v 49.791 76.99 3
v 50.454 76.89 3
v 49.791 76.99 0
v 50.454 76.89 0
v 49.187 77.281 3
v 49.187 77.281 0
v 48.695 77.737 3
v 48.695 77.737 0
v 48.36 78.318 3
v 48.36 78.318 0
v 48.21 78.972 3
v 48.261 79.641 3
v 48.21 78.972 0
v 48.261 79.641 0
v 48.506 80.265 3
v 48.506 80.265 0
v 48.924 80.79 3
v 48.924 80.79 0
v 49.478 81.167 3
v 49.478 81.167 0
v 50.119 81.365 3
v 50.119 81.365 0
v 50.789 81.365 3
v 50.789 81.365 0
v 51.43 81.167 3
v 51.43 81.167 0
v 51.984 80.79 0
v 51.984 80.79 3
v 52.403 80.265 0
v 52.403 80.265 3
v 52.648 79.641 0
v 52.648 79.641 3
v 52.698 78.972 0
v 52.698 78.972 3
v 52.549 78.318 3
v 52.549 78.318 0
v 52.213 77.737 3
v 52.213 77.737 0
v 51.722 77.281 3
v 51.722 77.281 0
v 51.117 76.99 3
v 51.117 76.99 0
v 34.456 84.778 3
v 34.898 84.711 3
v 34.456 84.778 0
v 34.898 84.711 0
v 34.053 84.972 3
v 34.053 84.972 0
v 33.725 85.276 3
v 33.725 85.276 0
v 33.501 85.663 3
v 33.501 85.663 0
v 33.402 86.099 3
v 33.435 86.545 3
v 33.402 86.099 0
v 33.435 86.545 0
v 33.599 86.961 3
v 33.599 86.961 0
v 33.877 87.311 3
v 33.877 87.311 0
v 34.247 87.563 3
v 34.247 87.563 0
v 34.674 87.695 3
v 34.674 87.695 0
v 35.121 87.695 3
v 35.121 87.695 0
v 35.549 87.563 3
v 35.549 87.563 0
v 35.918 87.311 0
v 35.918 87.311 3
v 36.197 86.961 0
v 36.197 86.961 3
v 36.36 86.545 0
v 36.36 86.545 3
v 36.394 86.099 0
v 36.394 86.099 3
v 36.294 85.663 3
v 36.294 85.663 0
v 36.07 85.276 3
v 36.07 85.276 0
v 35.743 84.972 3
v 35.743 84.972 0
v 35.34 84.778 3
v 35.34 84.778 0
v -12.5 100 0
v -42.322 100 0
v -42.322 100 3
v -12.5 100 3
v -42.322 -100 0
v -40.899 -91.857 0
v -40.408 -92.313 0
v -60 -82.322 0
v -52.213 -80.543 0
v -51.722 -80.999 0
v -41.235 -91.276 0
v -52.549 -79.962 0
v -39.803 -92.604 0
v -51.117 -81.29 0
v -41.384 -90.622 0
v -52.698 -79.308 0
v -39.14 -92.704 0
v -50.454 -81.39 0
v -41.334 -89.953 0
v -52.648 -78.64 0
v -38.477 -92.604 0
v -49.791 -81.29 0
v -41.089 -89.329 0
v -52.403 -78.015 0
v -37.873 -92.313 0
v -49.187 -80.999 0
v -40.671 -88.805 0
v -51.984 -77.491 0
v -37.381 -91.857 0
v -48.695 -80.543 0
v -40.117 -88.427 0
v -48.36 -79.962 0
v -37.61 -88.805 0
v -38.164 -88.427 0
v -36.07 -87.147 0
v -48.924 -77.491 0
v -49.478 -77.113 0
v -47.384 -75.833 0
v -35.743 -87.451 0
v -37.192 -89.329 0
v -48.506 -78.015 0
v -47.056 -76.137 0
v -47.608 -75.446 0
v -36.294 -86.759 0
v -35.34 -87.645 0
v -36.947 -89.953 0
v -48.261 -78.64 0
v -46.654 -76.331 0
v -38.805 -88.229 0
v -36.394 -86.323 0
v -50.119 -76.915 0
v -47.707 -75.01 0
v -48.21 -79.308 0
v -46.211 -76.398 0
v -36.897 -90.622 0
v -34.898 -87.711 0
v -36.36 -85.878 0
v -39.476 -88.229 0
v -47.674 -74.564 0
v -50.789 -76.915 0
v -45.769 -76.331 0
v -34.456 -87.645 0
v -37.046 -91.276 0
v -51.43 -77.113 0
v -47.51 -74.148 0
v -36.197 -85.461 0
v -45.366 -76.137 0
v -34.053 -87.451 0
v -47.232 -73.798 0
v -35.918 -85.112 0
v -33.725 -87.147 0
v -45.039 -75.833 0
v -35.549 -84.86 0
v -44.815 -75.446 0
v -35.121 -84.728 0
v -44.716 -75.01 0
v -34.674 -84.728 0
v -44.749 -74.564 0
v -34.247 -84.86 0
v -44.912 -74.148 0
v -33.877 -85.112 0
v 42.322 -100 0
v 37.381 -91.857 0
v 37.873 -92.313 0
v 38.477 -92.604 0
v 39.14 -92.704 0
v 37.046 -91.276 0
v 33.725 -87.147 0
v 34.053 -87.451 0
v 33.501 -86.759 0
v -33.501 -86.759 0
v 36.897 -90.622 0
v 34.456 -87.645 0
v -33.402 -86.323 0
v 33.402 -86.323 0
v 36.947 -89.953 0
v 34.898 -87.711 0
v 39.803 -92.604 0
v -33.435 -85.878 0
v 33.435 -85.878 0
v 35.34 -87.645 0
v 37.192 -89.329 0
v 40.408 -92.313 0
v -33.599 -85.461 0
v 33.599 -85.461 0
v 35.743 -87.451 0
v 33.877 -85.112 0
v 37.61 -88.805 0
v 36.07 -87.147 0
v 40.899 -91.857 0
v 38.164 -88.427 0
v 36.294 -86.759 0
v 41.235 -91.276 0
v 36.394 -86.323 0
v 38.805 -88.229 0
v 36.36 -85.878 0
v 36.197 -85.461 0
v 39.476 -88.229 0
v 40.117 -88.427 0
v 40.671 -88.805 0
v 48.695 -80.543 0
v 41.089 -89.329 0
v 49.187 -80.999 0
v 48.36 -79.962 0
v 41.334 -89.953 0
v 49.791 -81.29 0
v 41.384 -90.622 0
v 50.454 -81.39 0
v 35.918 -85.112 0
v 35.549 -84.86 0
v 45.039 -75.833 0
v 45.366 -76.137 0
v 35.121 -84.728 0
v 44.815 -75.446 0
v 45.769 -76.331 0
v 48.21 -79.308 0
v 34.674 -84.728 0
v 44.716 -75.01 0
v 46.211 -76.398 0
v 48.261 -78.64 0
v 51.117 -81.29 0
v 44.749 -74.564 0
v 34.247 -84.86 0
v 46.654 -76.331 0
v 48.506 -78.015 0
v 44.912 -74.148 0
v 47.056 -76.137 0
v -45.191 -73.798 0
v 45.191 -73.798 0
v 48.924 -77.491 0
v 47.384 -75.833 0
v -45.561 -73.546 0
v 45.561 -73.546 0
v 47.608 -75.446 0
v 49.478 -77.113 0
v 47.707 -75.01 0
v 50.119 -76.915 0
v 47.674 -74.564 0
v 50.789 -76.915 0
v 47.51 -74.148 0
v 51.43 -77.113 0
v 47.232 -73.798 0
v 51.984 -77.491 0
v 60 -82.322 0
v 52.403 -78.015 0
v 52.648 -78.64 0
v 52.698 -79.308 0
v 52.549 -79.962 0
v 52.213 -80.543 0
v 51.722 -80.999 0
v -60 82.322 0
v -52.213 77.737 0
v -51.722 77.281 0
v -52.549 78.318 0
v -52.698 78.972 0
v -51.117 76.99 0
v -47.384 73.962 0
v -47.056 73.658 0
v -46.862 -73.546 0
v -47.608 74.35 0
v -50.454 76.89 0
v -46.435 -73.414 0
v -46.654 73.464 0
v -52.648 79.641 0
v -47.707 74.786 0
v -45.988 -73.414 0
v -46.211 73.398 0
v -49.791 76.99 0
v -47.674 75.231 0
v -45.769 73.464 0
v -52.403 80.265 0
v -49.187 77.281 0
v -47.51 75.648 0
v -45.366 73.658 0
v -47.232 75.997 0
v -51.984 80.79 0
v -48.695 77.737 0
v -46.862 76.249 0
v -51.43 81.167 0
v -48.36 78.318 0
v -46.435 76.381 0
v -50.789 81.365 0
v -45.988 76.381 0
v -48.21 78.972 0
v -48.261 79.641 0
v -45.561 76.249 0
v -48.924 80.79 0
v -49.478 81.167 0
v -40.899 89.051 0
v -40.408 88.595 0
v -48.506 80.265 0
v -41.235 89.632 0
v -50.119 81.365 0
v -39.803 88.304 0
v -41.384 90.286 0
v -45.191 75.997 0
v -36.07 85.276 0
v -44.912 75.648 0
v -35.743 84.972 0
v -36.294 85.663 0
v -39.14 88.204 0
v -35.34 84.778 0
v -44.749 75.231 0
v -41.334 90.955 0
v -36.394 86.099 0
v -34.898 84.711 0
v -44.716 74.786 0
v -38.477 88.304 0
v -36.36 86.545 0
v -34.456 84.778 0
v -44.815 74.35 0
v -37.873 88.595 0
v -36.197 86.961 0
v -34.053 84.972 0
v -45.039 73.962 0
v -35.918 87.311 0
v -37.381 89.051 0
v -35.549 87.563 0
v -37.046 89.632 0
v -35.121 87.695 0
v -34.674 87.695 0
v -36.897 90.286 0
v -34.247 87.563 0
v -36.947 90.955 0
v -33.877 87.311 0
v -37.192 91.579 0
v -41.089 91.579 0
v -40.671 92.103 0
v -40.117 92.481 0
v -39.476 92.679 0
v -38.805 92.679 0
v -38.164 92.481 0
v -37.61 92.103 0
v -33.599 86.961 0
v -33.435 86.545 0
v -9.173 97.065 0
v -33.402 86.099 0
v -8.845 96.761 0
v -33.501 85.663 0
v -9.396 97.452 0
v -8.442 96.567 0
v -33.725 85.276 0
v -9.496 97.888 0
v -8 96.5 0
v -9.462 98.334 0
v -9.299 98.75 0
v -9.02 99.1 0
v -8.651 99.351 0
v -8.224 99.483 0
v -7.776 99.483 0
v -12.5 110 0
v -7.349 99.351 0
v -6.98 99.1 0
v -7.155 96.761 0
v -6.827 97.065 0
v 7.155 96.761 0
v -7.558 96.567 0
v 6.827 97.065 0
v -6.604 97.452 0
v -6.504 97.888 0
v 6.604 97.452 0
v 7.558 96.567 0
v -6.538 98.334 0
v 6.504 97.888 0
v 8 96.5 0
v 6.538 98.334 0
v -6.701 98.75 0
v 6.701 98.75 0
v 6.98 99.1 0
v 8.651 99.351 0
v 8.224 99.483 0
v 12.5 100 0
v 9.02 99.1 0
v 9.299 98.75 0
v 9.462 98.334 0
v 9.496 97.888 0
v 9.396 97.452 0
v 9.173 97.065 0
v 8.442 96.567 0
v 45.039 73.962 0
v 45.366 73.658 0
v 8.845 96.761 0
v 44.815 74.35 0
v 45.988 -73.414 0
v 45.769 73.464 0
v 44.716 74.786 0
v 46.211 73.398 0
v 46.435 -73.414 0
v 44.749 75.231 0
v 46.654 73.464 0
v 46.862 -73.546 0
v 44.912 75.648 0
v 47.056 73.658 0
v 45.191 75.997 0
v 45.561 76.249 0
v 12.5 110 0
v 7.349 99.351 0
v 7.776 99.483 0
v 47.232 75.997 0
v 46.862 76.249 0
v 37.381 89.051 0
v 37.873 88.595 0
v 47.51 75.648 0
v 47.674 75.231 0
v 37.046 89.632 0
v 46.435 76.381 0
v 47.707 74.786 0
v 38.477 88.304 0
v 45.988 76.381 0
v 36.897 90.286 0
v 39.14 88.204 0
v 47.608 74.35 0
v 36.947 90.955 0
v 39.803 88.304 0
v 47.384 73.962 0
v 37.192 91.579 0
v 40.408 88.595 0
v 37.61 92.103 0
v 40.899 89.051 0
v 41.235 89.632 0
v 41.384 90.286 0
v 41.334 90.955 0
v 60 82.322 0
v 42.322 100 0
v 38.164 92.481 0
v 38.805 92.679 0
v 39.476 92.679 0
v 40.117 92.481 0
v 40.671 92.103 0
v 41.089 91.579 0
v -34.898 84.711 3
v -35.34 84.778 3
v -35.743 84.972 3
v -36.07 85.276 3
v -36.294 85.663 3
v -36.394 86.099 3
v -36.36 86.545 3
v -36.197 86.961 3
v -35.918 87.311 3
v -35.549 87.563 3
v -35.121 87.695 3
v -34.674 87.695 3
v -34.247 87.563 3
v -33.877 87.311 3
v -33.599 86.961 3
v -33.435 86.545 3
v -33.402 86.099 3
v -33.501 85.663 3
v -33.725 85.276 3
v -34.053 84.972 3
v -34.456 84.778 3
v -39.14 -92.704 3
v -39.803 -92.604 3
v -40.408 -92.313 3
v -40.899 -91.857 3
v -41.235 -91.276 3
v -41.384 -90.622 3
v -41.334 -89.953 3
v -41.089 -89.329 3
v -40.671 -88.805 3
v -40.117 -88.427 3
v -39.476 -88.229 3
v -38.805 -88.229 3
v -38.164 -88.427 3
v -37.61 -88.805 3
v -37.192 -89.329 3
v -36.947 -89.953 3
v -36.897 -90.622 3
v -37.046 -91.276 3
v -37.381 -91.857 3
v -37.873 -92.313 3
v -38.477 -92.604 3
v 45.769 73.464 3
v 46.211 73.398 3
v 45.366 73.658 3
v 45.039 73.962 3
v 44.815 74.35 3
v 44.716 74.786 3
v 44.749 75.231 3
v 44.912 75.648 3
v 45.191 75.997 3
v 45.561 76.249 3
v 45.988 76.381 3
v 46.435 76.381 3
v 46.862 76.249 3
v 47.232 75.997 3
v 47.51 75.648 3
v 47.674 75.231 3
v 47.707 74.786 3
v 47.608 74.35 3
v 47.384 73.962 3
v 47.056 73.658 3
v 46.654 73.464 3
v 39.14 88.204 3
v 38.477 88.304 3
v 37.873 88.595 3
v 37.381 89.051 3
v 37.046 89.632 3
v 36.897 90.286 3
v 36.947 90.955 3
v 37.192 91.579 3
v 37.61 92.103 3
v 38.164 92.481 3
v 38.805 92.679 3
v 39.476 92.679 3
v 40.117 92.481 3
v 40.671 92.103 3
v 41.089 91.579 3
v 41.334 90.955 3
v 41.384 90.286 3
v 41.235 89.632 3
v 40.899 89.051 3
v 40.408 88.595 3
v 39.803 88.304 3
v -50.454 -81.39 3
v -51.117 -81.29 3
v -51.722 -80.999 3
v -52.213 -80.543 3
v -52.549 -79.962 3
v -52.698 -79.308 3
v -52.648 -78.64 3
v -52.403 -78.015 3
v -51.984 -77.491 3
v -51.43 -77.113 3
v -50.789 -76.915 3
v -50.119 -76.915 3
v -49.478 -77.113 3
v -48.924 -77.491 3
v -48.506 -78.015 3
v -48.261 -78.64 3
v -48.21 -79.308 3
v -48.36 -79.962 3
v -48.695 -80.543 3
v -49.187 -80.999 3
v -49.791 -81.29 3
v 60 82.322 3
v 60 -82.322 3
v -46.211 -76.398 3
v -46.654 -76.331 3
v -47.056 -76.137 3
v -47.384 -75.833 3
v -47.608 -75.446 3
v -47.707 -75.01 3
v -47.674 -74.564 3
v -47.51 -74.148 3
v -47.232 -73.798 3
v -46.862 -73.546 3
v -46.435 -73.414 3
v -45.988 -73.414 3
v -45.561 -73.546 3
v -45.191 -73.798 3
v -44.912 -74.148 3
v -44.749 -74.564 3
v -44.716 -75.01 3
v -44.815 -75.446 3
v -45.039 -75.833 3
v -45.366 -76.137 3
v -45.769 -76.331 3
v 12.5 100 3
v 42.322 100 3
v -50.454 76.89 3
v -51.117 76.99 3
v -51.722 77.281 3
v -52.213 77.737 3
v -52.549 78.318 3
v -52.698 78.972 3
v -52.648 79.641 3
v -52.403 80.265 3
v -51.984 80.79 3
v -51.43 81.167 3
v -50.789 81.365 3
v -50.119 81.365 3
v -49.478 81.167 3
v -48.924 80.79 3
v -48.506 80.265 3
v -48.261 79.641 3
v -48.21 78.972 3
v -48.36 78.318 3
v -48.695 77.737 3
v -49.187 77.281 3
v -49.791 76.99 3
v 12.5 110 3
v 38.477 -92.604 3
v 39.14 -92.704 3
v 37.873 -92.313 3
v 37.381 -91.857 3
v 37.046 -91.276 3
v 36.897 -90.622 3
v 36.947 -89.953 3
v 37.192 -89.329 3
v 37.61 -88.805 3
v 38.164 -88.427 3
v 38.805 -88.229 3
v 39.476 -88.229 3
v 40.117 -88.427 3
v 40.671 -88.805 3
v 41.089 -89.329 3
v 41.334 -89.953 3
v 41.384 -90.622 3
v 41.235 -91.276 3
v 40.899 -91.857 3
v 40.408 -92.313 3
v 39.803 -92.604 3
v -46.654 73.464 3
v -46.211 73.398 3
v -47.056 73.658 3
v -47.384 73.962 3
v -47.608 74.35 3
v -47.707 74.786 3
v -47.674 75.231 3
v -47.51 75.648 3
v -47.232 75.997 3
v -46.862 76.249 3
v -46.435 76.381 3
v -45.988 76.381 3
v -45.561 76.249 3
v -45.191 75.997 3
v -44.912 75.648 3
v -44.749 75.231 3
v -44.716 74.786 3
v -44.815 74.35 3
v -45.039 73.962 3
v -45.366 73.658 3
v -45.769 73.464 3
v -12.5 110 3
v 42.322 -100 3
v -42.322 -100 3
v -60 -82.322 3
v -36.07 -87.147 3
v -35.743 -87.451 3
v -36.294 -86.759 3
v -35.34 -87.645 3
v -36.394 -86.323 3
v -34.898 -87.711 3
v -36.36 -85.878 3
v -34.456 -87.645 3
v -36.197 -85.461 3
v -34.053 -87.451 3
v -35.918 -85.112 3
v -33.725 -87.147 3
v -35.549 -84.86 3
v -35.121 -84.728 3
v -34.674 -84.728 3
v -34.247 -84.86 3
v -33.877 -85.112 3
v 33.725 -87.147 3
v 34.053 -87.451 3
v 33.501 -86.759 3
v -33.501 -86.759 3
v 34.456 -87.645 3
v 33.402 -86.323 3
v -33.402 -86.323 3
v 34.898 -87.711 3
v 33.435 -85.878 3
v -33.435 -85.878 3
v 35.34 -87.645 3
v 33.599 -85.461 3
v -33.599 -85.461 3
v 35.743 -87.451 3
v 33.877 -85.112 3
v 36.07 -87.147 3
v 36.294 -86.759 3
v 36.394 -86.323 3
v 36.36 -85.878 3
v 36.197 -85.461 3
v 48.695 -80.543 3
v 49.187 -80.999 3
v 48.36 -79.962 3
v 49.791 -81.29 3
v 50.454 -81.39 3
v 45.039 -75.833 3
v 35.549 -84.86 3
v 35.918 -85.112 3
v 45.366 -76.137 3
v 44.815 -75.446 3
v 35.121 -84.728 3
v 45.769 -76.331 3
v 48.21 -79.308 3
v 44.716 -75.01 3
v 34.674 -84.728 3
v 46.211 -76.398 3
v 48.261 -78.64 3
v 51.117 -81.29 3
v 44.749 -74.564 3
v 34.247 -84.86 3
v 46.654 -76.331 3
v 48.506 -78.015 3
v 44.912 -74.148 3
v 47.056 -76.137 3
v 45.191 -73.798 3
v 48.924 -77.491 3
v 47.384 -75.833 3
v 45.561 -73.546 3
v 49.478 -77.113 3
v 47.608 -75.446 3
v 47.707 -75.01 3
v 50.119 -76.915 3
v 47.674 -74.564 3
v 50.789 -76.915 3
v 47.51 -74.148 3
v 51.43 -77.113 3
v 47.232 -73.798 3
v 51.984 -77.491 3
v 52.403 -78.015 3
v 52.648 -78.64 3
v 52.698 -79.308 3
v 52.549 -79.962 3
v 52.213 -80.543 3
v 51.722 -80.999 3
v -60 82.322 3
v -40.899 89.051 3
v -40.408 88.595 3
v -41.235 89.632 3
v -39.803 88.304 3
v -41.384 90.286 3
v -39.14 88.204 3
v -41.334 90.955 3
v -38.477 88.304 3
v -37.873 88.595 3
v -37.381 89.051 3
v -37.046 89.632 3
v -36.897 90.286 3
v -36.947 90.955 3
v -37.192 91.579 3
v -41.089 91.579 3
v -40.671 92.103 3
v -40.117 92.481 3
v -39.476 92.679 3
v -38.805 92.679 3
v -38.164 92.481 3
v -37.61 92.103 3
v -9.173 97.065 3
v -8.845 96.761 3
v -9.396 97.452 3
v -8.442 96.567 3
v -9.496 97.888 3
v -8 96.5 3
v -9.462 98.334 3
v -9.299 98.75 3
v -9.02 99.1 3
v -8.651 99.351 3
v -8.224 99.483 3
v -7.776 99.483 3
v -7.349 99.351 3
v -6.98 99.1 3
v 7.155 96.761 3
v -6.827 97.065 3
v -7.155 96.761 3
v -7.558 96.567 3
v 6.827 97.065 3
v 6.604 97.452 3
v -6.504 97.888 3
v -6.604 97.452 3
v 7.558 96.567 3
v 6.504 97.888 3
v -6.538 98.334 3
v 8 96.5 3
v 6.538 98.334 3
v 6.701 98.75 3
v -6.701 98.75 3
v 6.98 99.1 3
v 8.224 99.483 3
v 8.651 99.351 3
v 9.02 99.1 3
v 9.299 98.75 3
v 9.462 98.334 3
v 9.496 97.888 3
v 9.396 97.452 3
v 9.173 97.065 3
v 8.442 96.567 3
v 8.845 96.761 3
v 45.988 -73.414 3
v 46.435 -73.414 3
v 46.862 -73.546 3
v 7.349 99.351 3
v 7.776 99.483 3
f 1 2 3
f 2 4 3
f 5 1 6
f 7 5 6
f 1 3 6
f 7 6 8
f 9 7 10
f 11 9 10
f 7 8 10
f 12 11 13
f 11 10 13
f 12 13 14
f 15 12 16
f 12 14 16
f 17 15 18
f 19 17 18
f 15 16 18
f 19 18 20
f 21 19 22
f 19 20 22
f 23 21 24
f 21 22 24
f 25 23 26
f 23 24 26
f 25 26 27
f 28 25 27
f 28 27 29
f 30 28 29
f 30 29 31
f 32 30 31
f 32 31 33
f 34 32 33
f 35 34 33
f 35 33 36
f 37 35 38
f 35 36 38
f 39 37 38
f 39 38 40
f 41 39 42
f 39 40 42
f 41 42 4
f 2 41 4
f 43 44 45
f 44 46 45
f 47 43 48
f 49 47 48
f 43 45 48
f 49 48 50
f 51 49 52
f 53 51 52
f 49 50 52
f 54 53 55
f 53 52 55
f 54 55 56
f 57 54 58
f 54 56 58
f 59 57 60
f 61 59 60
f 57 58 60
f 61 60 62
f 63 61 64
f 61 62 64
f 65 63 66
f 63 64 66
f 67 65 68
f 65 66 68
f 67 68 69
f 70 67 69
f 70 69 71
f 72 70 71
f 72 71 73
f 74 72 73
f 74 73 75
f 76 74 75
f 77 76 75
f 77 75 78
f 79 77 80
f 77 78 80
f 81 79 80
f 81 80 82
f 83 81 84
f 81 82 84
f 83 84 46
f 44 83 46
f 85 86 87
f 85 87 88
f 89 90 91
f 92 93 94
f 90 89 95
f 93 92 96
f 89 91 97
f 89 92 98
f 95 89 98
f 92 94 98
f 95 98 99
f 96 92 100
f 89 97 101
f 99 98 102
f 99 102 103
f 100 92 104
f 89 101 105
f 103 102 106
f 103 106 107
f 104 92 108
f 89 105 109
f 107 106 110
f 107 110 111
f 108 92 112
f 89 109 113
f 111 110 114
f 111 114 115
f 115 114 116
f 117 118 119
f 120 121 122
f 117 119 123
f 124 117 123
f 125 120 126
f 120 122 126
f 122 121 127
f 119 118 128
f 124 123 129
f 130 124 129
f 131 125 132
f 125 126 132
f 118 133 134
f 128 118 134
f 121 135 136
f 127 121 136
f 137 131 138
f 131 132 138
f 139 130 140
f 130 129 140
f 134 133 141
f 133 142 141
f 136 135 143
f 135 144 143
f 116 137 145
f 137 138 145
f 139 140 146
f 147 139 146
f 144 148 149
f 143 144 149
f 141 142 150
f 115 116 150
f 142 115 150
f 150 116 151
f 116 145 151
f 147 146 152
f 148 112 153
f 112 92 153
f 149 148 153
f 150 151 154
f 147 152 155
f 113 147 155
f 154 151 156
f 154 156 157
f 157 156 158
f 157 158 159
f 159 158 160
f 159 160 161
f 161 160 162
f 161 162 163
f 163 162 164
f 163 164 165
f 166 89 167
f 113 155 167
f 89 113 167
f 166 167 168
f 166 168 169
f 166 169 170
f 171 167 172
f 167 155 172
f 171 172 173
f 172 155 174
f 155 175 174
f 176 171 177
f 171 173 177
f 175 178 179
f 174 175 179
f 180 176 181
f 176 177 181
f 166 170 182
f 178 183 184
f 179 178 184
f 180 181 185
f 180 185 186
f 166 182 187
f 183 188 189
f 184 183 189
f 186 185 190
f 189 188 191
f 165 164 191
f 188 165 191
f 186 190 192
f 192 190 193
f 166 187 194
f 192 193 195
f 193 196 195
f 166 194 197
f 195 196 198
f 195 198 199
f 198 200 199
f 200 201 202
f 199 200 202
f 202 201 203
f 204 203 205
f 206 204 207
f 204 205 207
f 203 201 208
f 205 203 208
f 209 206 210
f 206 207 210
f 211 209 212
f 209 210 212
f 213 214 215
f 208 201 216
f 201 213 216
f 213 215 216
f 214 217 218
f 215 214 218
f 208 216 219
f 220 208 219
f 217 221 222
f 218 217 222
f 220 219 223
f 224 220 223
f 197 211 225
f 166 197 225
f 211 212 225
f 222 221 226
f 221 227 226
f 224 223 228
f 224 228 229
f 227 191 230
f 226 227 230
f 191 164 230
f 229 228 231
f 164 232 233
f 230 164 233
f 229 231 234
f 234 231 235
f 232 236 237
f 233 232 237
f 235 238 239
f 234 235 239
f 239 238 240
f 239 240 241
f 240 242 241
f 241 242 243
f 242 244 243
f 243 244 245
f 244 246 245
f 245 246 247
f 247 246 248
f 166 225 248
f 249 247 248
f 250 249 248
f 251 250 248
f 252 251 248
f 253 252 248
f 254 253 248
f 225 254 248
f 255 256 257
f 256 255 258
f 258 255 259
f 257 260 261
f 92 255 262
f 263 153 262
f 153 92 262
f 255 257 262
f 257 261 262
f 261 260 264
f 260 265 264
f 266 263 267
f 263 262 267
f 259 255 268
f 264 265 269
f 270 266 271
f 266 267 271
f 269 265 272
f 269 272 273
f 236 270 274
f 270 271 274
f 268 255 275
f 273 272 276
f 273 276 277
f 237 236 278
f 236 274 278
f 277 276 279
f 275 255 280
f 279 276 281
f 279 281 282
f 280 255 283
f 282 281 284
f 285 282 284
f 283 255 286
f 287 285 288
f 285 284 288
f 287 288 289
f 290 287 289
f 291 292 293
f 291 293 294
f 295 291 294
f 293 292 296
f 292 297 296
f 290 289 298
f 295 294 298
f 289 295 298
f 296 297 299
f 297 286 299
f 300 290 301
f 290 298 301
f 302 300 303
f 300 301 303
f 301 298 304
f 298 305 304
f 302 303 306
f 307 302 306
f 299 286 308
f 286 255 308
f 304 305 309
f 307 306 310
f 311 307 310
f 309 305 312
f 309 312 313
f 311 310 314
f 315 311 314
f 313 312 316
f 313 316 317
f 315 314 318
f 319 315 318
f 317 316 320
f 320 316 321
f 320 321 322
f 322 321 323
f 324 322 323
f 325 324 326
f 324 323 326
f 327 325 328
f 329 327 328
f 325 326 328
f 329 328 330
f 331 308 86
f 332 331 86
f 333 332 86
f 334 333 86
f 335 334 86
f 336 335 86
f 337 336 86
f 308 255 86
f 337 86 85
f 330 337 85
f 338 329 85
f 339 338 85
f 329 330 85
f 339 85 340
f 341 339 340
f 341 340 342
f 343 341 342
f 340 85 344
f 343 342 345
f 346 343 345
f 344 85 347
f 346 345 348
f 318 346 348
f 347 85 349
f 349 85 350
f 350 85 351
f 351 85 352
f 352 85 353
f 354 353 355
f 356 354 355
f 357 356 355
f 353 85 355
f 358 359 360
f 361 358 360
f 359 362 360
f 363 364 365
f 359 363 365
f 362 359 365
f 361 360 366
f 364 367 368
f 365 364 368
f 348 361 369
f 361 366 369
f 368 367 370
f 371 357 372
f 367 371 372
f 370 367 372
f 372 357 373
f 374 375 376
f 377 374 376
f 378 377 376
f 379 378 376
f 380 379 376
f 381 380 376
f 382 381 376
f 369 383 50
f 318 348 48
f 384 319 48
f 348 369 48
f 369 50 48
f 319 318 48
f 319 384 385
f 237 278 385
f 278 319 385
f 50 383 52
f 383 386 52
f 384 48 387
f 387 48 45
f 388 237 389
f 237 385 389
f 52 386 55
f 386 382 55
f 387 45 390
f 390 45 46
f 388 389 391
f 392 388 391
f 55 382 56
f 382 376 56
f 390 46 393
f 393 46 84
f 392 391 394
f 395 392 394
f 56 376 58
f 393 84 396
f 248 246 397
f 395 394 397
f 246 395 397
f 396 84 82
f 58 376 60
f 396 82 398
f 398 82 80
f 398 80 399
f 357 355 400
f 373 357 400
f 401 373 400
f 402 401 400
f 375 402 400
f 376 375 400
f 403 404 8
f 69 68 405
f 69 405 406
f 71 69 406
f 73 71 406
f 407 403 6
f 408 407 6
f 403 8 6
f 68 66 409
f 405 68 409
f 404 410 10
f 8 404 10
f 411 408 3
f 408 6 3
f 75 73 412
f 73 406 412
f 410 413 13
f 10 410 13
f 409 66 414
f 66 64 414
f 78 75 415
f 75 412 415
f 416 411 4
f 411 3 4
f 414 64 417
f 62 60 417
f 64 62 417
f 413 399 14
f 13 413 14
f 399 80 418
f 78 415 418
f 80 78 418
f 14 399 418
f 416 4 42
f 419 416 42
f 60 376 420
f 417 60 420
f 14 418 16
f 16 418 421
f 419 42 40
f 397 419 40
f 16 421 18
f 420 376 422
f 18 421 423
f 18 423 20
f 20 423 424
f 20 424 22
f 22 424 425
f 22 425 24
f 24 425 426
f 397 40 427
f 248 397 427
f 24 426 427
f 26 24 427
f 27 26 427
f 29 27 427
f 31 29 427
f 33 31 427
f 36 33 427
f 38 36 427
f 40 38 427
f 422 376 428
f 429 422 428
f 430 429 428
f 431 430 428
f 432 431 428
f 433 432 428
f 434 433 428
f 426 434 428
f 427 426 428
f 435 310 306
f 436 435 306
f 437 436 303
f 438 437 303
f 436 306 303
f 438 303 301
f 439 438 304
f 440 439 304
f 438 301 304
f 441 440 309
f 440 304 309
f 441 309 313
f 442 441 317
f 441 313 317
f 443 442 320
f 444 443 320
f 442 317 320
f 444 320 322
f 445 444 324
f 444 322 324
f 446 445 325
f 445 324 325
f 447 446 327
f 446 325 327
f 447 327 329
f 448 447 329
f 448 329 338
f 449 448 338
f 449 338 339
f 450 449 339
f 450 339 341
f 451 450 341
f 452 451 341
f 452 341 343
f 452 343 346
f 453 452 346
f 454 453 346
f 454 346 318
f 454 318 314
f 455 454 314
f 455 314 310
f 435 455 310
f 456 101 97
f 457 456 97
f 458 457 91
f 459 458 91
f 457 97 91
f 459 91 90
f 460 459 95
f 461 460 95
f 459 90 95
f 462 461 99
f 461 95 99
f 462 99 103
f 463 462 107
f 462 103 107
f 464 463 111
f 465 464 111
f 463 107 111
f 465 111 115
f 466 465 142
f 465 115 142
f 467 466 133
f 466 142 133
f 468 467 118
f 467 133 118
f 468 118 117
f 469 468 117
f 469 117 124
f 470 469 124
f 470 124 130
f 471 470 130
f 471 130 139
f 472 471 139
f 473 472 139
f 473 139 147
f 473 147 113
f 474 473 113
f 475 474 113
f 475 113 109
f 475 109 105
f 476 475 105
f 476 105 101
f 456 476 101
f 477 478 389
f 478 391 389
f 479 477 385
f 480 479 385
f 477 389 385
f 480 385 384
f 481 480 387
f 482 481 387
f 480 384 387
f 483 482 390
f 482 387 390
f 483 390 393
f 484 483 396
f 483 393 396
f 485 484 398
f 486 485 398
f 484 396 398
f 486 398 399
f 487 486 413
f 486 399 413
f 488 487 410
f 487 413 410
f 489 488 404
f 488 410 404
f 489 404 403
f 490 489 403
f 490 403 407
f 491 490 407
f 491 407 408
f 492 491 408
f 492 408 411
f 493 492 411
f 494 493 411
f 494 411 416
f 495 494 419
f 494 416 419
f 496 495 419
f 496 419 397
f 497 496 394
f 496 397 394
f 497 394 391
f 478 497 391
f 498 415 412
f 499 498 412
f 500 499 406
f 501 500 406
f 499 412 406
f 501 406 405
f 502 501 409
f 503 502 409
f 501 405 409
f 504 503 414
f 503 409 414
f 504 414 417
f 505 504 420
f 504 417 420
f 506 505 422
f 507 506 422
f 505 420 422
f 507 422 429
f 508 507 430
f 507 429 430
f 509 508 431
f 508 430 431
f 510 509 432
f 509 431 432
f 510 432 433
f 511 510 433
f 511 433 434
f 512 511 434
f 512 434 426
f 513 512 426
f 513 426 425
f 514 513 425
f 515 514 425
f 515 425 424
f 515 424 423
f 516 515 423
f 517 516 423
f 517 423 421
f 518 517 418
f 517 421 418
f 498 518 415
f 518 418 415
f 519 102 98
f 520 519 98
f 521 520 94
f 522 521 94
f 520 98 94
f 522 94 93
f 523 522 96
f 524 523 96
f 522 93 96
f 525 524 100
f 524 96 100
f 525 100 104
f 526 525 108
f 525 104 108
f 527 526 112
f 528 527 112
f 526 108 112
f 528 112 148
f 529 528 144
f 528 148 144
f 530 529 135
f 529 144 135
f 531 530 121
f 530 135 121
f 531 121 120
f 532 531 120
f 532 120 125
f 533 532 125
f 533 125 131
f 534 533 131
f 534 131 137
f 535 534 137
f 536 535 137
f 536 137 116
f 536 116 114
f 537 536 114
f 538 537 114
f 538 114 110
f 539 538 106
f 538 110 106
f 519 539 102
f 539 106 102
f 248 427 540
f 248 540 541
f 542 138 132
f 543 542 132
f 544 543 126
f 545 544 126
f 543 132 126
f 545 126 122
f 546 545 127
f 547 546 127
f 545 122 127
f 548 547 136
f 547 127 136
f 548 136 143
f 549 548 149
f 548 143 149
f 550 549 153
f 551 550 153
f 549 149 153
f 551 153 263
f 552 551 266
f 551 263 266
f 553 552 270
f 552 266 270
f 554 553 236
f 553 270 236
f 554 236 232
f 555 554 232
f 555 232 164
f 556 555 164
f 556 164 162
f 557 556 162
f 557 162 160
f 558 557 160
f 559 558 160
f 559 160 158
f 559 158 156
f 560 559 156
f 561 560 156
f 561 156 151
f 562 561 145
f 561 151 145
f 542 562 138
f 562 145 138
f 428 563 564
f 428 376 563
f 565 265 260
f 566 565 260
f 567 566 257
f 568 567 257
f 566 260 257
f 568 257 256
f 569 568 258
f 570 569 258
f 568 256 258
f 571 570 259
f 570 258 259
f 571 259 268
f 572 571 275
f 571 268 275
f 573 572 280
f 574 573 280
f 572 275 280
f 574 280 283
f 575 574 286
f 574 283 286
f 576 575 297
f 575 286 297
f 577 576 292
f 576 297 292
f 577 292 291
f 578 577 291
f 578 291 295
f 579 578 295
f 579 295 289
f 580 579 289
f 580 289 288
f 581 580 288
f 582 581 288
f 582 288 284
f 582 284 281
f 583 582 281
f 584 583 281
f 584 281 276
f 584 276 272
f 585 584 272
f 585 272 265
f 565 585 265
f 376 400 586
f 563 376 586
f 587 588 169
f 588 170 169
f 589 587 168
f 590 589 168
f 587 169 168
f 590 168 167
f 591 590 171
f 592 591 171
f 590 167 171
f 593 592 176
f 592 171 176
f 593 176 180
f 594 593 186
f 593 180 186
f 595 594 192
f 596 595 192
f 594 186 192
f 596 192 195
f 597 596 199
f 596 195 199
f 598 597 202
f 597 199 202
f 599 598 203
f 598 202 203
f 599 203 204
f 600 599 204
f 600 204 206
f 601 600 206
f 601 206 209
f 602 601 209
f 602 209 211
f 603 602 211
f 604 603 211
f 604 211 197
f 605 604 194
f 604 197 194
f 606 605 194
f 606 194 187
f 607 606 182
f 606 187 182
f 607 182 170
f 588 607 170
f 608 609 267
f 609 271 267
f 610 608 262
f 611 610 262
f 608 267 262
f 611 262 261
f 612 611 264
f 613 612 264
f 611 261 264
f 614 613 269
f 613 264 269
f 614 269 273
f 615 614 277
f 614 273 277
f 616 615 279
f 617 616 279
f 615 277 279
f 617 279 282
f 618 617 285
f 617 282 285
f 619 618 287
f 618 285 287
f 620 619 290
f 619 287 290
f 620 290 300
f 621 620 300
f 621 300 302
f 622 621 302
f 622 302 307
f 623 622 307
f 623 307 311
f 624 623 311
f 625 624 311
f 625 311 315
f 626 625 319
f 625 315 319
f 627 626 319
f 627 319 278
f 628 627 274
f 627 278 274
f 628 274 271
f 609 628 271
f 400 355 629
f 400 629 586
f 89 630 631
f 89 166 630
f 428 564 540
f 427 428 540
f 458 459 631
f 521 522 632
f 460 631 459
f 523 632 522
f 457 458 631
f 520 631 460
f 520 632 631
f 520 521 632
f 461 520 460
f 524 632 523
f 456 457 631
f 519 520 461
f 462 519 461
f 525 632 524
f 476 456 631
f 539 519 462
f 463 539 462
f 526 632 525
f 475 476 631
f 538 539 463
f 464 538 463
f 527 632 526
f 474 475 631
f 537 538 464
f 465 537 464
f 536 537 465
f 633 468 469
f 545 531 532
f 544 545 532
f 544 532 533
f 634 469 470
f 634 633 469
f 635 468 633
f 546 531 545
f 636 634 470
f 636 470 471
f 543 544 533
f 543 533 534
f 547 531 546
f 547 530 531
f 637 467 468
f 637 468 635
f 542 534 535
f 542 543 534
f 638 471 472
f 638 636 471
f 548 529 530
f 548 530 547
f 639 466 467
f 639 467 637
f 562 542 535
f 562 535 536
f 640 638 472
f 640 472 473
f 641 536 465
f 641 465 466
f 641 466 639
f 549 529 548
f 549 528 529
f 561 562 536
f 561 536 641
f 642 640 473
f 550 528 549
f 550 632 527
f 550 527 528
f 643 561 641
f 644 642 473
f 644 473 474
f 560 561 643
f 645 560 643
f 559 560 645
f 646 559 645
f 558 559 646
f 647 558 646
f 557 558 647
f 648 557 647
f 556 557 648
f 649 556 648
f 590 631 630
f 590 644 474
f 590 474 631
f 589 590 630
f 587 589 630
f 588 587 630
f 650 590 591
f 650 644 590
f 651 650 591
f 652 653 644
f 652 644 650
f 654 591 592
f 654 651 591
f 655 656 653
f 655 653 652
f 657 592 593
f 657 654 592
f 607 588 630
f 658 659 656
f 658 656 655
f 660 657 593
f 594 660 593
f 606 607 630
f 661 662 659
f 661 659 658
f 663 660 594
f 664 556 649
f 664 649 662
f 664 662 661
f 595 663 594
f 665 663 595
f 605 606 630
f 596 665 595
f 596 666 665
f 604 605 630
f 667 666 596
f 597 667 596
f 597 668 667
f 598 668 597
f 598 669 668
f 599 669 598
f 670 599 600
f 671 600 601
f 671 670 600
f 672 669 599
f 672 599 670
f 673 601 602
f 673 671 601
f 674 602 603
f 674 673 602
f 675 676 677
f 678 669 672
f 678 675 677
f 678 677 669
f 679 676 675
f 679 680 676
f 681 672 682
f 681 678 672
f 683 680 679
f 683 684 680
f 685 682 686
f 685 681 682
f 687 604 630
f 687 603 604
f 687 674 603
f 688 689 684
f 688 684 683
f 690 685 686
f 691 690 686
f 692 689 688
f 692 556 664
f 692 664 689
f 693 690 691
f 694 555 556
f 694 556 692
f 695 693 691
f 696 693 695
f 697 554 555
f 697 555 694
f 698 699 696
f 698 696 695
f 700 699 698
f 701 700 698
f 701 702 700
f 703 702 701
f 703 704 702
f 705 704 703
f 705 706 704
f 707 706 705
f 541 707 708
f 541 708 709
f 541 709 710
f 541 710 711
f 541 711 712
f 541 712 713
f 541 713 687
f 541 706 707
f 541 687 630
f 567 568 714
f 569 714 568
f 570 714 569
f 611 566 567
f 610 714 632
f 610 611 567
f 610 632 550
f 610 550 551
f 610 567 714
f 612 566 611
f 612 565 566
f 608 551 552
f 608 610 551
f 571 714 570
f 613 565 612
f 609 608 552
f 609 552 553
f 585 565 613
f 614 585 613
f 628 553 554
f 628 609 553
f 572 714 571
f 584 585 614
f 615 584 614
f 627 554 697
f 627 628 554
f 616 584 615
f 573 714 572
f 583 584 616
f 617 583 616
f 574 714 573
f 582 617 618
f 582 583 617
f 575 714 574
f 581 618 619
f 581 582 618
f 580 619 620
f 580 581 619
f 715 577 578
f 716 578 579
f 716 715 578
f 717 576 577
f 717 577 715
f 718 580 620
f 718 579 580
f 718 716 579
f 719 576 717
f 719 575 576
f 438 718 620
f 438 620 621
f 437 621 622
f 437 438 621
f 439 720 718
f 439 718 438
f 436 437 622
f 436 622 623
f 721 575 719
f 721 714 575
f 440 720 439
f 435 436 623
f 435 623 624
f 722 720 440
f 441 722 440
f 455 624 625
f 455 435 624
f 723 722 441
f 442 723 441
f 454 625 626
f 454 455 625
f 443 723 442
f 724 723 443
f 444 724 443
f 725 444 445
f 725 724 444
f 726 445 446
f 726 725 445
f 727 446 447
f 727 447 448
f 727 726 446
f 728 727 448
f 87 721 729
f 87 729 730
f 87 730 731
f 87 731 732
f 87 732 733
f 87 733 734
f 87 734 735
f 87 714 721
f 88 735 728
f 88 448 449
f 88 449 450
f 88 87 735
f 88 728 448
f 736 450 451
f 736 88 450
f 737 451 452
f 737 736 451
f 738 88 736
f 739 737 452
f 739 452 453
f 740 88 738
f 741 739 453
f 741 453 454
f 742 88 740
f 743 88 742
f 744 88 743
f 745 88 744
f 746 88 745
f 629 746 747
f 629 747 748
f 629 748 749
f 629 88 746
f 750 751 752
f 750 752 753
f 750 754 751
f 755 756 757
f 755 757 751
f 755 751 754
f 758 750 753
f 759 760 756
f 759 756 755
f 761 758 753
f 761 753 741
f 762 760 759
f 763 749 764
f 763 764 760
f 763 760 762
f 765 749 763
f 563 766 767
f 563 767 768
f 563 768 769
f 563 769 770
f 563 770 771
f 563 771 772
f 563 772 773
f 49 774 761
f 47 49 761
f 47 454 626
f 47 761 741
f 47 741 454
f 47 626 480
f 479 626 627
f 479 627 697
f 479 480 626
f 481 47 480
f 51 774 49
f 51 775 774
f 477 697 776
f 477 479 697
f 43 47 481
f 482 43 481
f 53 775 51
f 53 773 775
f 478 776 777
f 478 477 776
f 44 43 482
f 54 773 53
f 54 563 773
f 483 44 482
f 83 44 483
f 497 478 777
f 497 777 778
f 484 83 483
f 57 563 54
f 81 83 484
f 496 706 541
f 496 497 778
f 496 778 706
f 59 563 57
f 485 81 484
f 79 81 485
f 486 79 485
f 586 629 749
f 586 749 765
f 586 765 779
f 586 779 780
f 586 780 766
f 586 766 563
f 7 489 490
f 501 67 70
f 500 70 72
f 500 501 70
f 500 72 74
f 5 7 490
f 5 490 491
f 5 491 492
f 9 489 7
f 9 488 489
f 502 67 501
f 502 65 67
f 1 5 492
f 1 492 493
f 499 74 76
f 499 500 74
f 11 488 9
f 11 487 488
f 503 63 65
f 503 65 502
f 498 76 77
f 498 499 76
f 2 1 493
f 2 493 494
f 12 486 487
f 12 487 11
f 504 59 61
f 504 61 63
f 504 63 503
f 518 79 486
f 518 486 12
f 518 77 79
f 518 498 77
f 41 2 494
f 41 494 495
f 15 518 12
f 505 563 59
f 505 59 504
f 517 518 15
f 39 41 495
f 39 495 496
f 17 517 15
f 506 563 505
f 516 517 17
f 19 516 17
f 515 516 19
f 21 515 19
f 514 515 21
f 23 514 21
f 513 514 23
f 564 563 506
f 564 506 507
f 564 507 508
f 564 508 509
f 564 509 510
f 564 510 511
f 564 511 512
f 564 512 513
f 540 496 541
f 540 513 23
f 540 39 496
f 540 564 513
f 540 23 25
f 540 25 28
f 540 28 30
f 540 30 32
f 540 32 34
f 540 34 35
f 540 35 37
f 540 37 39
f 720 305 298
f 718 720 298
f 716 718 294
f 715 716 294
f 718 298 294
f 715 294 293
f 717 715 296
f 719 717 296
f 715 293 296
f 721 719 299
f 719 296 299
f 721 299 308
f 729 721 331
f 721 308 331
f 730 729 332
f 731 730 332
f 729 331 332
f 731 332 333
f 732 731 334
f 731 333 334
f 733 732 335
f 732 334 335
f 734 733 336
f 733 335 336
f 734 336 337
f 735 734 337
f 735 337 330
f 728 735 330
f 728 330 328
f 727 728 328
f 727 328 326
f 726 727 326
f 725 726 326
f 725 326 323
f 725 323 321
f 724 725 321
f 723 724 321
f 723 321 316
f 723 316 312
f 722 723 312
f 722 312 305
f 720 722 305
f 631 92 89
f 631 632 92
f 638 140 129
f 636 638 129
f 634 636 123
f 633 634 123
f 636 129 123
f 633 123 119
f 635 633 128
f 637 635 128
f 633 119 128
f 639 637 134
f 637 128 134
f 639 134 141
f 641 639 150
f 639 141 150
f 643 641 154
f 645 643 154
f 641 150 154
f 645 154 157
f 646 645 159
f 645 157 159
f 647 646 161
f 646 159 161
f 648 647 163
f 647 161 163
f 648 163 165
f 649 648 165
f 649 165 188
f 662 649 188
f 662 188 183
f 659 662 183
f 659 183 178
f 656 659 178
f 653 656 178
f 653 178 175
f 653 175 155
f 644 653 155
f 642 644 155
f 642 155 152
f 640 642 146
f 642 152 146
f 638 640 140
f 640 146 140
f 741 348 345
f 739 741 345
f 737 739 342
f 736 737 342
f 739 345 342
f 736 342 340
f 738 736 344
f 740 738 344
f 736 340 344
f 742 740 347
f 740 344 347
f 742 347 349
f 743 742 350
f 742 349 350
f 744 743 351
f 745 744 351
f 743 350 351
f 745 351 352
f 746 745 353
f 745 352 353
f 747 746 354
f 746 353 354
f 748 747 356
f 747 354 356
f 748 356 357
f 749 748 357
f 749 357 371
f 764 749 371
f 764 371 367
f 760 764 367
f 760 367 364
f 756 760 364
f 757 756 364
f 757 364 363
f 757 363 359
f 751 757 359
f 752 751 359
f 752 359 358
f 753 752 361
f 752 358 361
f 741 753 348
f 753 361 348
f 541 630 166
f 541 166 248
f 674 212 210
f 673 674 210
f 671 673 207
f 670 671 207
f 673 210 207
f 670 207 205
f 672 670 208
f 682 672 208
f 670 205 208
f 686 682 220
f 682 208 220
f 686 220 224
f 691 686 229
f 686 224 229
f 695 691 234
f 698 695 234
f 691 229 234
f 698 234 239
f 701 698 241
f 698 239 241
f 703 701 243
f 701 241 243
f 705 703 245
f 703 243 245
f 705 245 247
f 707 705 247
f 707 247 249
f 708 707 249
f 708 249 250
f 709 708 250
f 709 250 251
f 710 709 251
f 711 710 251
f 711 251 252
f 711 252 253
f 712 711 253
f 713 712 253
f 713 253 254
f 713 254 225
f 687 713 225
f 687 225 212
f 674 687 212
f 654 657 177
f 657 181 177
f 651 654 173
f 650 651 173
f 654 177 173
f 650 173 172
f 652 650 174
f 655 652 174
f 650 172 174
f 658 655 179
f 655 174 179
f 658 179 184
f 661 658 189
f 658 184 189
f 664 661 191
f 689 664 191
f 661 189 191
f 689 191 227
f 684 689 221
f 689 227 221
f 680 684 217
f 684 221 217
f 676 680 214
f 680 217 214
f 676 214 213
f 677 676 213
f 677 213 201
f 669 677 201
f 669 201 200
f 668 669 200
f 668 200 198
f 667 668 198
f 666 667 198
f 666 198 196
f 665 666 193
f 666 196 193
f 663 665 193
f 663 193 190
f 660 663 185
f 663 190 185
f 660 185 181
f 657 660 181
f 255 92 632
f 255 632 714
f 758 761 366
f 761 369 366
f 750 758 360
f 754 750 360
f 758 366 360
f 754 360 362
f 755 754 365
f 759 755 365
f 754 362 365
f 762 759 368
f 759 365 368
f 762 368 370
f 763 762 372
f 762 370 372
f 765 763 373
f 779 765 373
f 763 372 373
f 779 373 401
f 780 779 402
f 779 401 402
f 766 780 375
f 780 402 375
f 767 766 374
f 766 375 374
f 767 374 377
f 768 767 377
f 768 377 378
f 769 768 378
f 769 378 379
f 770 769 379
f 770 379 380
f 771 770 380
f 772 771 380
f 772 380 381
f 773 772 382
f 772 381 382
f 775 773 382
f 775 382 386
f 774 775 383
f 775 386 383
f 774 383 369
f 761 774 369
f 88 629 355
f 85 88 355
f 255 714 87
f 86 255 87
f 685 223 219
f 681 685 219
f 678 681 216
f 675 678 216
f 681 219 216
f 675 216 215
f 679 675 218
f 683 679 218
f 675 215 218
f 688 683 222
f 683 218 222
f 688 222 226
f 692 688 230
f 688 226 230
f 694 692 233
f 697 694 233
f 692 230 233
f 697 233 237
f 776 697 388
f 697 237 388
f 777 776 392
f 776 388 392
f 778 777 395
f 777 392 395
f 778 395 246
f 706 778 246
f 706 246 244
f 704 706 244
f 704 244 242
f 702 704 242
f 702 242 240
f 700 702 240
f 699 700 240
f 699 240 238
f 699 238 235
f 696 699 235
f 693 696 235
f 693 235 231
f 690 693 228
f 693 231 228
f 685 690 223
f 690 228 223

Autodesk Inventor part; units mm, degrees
ref_plane "YZ Plane" through (0, 0, 0) normal (1, 0, 0) x (0, 1, 0)
ref_plane "XZ Plane" through (0, 0, 0) normal (0, 1, 0) x (-1, 0, 0)
ref_plane "XY Plane" through (0, 0, 0) normal (0, 0, 1) x (1, 0, 0)
sketch "スケッチ1" plane through (0, 0, 0) normal (0, 0, 1) x (1, 0, 0)
  line L0 (-60, 100) -> (60, 100)
  line L1 (60, 100) -> (60, -100)
  line L2 (60, -100) -> (-60, -100)
  line L3 (-60, -100) -> (-60, 100)
  line L4 (60, 117.6777) -> (77.6777, 100)
  line L5 (77.6777, 100) -> (60, 82.3223)
  line L6 (60, 82.3223) -> (42.3223, 100)
  line L7 (42.3223, 100) -> (60, 117.6777)
  line L8 (60, -82.3223) -> (77.6777, -100)
  line L9 (77.6777, -100) -> (60, -117.6777)
  line L10 (60, -117.6777) -> (42.3223, -100)
  line L11 (42.3223, -100) -> (60, -82.3223)
  line L12 (-60, -82.3223) -> (-42.3223, -100)
  line L13 (-42.3223, -100) -> (-60, -117.6777)
  line L14 (-60, -117.6777) -> (-77.6777, -100)
  line L15 (-77.6777, -100) -> (-60, -82.3223)
  line L16 (-60, 117.6777) -> (-42.3223, 100)
  line L17 (-42.3223, 100) -> (-60, 82.3223)
  line L18 (-60, 82.3223) -> (-77.6777, 100)
  line L19 (-77.6777, 100) -> (-60, 117.6777)
  point P0 (0, 0)
  dimension "d0" = 200
  dimension "d1" = 100
  dimension "d2" = 120
  dimension "d3" = 60
  dimension "d4" = 12.5
  dimension "d5" = 12.5
  dimension "d6" = 12.5
  dimension "d7" = 12.5
extrude "押し出し1" add sketch "スケッチ1" along normal blind 3
sketch "スケッチ2" plane through (0, 0, 3) normal (0, 0, 1) x (1, 0, 0)
  line L0 (77.6777, 100) -> (60, 82.3223) projected
  line L1 (60, 117.6777) -> (77.6777, 100) projected
  line L2 (42.3223, 100) -> (60, 117.6777) projected
  line L3 (-60, 117.6777) -> (-42.3223, 100) projected
  line L4 (-77.6777, 100) -> (-60, 117.6777) projected
  line L5 (-60, 82.3223) -> (-77.6777, 100) projected
  line L6 (-77.6777, -100) -> (-60, -82.3223) projected
  line L7 (-60, -117.6777) -> (-77.6777, -100) projected
  line L8 (-42.3223, -100) -> (-60, -117.6777) projected
  line L9 (60, -117.6777) -> (42.3223, -100) projected
  line L10 (77.6777, -100) -> (60, -117.6777) projected
  line L11 (60, -82.3223) -> (77.6777, -100) projected
  circle A0 centre (-46.2114, -74.8977) radius 1.5
  circle A1 centre (-34.8977, -86.2114) radius 1.5
  circle A2 centre (34.8977, -86.2114) radius 1.5
  circle A3 centre (46.2114, -74.8977) radius 1.5
  circle A4 centre (46.2114, 74.8977) radius 1.5
  circle A5 centre (34.8977, 86.2114) radius 1.5
  circle A6 centre (-34.8977, 86.2114) radius 1.5
  circle A7 centre (-46.2114, 74.8977) radius 1.5
  point P0 (0, 0)
  dimension "d10" = 3
  dimension "d12" = 40
  dimension "d13" = 40
  dimension "d14" = 4.5
  dimension "d15" = 4.5
  dimension "d16" = 40
  dimension "d17" = 40
  dimension "d18" = 40
  dimension "d19" = 40
  dimension "d20" = 40
  dimension "d21" = 40
  dimension "d22" = 4.5
  dimension "d23" = 4.5
  dimension "d24" = 4.5
  dimension "d25" = 4.5
  dimension "d26" = 4.5
  dimension "d27" = 4.5
hole "穴1" at (34.8977, -86.2114, 3) at (46.2114, -74.8977, 3) at (-34.8977, -86.2114, 3) at (-46.2114, -74.8977, 3) at (34.8977, 86.2114, 3) at (46.2114, 74.8977, 3) at (-46.2114, 74.8977, 3) at (-34.8977, 86.2114, 3) direction (0, 0, -1) diameter 3 end through all
sketch "スケッチ3" plane through (0, 0, 3) normal (0, 0, 1) x (1, 0, 0)
  line L0 (77.6777, 100) -> (60, 82.3223) projected
  line L1 (60, 117.6777) -> (77.6777, 100) projected
  line L2 (42.3223, 100) -> (60, 117.6777) projected
  line L3 (-60, 117.6777) -> (-42.3223, 100) projected
  line L4 (-77.6777, 100) -> (-60, 117.6777) projected
  line L5 (-60, 82.3223) -> (-77.6777, 100) projected
  line L6 (-77.6777, -100) -> (-60, -82.3223) projected
  line L7 (-60, -117.6777) -> (-77.6777, -100) projected
  line L8 (-42.3223, -100) -> (-60, -117.6777) projected
  line L9 (60, -117.6777) -> (42.3223, -100) projected
  line L10 (77.6777, -100) -> (60, -117.6777) projected
  line L11 (60, -82.3223) -> (77.6777, -100) projected
  circle A0 centre (-39.1403, 90.4541) radius 2.25
  circle A1 centre (-50.4541, 79.1403) radius 2.25
  circle A2 centre (-50.4541, -79.1403) radius 2.25
  circle A3 centre (-39.1403, -90.4541) radius 2.25
  circle A4 centre (39.1403, -90.4541) radius 2.25
  circle A5 centre (50.4541, -79.1403) radius 2.25
  circle A6 centre (50.4541, 79.1403) radius 2.25
  circle A7 centre (39.1403, 90.4541) radius 2.25
  point P0 (0, 0)
  dimension "d35" = 4.5
  dimension "d37" = 4.5
  dimension "d38" = 4.5
  dimension "d39" = 34
  dimension "d40" = 34
  dimension "d41" = 4.5
  dimension "d42" = 4.5
  dimension "d43" = 34
  dimension "d44" = 34
  dimension "d45" = 34
  dimension "d46" = 4.5
  dimension "d47" = 4.5
  dimension "d48" = 34
  dimension "d49" = 34
  dimension "d50" = 34
  dimension "d51" = 4.5
  dimension "d52" = 4.5
hole "穴2" at (-50.4541, -79.1403, 3) at (-39.1403, -90.4541, 3) at (39.1403, 90.4541, 3) at (50.4541, 79.1403, 3) at (-50.4541, 79.1403, 3) at (-39.1403, 90.4541, 3) at (39.1403, -90.4541, 3) at (50.4541, -79.1403, 3) direction (0, 0, -1) diameter 4.5 end through all
sketch "スケッチ4" plane through (0, 0, 3) normal (0, 0, 1) x (1, 0, 0)
  line L0 (77.6777, 100) -> (60, 82.3223) projected
  line L1 (60, 117.6777) -> (77.6777, 100) projected
  line L2 (42.3223, 100) -> (60, 117.6777) projected
  line L3 (-60, 117.6777) -> (-42.3223, 100) projected
  line L4 (-77.6777, 100) -> (-60, 117.6777) projected
  line L5 (-60, 82.3223) -> (-77.6777, 100) projected
  line L6 (-77.6777, -100) -> (-60, -82.3223) projected
  line L7 (-60, -117.6777) -> (-77.6777, -100) projected
  line L8 (-42.3223, -100) -> (-60, -117.6777) projected
  line L9 (60, -117.6777) -> (42.3223, -100) projected
  line L10 (77.6777, -100) -> (60, -117.6777) projected
  line L11 (60, -82.3223) -> (77.6777, -100) projected
  line L12 (-60, -82.3223) -> (-42.3223, -100)
  line L13 (42.3223, -100) -> (60, -82.3223)
  line L14 (42.3223, 100) -> (60, 82.3223)
  line L15 (-60, 82.3223) -> (-42.3223, 100)
  point P0 (0, 0)
  dimension "d60" = 25
  dimension "d61" = 25
  dimension "d62" = 25
  dimension "d63" = 25
extrude "押し出し2" cut sketch "スケッチ4" against normal blind 3
sketch "スケッチ6" plane through (-42.3223, 100, 0) normal (0, 1, 0) x (1, 0, 0)
  line L0 (84.6447, 0) -> (0, 0) projected
  line L1 (0, -3) -> (84.6447, -3) projected
  line L2 (29.8223, 0) -> (54.8223, 0)
  line L3 (54.8223, 0) -> (54.8223, -3)
  line L4 (54.8223, -3) -> (29.8223, -3)
  line L5 (29.8223, -3) -> (29.8223, 0)
  point P0 (42.3223, 0)
  dimension "d66" = 25
  dimension "d68" = 12.5
extrude "押し出し3" add sketch "スケッチ6" along normal blind 10
sketch "スケッチ7" plane through (0, 0, 3) normal (0, 0, 1) x (1, 0, 0)
  line L0 (-12.5, 110) -> (12.5, 110) projected
  line L1 (-12.5, 100) -> (-12.5, 110) projected
  circle A0 centre (-8, 98) radius 1.5
  circle A1 centre (8, 98) radius 1.5
  point P0 (0, 0)
  dimension "d71" = 16
  dimension "d72" = 12
  dimension "d73" = 12
  dimension "d74" = 3
  dimension "d75" = 4.5
hole "穴3" at (-8, 98, 3) at (8, 98, 3) direction (0, 0, -1) diameter 3 end through all
equation "\"d33\" = d26"
equation "\"d58\" = d46"
properties material "アルミニウム 6061"
